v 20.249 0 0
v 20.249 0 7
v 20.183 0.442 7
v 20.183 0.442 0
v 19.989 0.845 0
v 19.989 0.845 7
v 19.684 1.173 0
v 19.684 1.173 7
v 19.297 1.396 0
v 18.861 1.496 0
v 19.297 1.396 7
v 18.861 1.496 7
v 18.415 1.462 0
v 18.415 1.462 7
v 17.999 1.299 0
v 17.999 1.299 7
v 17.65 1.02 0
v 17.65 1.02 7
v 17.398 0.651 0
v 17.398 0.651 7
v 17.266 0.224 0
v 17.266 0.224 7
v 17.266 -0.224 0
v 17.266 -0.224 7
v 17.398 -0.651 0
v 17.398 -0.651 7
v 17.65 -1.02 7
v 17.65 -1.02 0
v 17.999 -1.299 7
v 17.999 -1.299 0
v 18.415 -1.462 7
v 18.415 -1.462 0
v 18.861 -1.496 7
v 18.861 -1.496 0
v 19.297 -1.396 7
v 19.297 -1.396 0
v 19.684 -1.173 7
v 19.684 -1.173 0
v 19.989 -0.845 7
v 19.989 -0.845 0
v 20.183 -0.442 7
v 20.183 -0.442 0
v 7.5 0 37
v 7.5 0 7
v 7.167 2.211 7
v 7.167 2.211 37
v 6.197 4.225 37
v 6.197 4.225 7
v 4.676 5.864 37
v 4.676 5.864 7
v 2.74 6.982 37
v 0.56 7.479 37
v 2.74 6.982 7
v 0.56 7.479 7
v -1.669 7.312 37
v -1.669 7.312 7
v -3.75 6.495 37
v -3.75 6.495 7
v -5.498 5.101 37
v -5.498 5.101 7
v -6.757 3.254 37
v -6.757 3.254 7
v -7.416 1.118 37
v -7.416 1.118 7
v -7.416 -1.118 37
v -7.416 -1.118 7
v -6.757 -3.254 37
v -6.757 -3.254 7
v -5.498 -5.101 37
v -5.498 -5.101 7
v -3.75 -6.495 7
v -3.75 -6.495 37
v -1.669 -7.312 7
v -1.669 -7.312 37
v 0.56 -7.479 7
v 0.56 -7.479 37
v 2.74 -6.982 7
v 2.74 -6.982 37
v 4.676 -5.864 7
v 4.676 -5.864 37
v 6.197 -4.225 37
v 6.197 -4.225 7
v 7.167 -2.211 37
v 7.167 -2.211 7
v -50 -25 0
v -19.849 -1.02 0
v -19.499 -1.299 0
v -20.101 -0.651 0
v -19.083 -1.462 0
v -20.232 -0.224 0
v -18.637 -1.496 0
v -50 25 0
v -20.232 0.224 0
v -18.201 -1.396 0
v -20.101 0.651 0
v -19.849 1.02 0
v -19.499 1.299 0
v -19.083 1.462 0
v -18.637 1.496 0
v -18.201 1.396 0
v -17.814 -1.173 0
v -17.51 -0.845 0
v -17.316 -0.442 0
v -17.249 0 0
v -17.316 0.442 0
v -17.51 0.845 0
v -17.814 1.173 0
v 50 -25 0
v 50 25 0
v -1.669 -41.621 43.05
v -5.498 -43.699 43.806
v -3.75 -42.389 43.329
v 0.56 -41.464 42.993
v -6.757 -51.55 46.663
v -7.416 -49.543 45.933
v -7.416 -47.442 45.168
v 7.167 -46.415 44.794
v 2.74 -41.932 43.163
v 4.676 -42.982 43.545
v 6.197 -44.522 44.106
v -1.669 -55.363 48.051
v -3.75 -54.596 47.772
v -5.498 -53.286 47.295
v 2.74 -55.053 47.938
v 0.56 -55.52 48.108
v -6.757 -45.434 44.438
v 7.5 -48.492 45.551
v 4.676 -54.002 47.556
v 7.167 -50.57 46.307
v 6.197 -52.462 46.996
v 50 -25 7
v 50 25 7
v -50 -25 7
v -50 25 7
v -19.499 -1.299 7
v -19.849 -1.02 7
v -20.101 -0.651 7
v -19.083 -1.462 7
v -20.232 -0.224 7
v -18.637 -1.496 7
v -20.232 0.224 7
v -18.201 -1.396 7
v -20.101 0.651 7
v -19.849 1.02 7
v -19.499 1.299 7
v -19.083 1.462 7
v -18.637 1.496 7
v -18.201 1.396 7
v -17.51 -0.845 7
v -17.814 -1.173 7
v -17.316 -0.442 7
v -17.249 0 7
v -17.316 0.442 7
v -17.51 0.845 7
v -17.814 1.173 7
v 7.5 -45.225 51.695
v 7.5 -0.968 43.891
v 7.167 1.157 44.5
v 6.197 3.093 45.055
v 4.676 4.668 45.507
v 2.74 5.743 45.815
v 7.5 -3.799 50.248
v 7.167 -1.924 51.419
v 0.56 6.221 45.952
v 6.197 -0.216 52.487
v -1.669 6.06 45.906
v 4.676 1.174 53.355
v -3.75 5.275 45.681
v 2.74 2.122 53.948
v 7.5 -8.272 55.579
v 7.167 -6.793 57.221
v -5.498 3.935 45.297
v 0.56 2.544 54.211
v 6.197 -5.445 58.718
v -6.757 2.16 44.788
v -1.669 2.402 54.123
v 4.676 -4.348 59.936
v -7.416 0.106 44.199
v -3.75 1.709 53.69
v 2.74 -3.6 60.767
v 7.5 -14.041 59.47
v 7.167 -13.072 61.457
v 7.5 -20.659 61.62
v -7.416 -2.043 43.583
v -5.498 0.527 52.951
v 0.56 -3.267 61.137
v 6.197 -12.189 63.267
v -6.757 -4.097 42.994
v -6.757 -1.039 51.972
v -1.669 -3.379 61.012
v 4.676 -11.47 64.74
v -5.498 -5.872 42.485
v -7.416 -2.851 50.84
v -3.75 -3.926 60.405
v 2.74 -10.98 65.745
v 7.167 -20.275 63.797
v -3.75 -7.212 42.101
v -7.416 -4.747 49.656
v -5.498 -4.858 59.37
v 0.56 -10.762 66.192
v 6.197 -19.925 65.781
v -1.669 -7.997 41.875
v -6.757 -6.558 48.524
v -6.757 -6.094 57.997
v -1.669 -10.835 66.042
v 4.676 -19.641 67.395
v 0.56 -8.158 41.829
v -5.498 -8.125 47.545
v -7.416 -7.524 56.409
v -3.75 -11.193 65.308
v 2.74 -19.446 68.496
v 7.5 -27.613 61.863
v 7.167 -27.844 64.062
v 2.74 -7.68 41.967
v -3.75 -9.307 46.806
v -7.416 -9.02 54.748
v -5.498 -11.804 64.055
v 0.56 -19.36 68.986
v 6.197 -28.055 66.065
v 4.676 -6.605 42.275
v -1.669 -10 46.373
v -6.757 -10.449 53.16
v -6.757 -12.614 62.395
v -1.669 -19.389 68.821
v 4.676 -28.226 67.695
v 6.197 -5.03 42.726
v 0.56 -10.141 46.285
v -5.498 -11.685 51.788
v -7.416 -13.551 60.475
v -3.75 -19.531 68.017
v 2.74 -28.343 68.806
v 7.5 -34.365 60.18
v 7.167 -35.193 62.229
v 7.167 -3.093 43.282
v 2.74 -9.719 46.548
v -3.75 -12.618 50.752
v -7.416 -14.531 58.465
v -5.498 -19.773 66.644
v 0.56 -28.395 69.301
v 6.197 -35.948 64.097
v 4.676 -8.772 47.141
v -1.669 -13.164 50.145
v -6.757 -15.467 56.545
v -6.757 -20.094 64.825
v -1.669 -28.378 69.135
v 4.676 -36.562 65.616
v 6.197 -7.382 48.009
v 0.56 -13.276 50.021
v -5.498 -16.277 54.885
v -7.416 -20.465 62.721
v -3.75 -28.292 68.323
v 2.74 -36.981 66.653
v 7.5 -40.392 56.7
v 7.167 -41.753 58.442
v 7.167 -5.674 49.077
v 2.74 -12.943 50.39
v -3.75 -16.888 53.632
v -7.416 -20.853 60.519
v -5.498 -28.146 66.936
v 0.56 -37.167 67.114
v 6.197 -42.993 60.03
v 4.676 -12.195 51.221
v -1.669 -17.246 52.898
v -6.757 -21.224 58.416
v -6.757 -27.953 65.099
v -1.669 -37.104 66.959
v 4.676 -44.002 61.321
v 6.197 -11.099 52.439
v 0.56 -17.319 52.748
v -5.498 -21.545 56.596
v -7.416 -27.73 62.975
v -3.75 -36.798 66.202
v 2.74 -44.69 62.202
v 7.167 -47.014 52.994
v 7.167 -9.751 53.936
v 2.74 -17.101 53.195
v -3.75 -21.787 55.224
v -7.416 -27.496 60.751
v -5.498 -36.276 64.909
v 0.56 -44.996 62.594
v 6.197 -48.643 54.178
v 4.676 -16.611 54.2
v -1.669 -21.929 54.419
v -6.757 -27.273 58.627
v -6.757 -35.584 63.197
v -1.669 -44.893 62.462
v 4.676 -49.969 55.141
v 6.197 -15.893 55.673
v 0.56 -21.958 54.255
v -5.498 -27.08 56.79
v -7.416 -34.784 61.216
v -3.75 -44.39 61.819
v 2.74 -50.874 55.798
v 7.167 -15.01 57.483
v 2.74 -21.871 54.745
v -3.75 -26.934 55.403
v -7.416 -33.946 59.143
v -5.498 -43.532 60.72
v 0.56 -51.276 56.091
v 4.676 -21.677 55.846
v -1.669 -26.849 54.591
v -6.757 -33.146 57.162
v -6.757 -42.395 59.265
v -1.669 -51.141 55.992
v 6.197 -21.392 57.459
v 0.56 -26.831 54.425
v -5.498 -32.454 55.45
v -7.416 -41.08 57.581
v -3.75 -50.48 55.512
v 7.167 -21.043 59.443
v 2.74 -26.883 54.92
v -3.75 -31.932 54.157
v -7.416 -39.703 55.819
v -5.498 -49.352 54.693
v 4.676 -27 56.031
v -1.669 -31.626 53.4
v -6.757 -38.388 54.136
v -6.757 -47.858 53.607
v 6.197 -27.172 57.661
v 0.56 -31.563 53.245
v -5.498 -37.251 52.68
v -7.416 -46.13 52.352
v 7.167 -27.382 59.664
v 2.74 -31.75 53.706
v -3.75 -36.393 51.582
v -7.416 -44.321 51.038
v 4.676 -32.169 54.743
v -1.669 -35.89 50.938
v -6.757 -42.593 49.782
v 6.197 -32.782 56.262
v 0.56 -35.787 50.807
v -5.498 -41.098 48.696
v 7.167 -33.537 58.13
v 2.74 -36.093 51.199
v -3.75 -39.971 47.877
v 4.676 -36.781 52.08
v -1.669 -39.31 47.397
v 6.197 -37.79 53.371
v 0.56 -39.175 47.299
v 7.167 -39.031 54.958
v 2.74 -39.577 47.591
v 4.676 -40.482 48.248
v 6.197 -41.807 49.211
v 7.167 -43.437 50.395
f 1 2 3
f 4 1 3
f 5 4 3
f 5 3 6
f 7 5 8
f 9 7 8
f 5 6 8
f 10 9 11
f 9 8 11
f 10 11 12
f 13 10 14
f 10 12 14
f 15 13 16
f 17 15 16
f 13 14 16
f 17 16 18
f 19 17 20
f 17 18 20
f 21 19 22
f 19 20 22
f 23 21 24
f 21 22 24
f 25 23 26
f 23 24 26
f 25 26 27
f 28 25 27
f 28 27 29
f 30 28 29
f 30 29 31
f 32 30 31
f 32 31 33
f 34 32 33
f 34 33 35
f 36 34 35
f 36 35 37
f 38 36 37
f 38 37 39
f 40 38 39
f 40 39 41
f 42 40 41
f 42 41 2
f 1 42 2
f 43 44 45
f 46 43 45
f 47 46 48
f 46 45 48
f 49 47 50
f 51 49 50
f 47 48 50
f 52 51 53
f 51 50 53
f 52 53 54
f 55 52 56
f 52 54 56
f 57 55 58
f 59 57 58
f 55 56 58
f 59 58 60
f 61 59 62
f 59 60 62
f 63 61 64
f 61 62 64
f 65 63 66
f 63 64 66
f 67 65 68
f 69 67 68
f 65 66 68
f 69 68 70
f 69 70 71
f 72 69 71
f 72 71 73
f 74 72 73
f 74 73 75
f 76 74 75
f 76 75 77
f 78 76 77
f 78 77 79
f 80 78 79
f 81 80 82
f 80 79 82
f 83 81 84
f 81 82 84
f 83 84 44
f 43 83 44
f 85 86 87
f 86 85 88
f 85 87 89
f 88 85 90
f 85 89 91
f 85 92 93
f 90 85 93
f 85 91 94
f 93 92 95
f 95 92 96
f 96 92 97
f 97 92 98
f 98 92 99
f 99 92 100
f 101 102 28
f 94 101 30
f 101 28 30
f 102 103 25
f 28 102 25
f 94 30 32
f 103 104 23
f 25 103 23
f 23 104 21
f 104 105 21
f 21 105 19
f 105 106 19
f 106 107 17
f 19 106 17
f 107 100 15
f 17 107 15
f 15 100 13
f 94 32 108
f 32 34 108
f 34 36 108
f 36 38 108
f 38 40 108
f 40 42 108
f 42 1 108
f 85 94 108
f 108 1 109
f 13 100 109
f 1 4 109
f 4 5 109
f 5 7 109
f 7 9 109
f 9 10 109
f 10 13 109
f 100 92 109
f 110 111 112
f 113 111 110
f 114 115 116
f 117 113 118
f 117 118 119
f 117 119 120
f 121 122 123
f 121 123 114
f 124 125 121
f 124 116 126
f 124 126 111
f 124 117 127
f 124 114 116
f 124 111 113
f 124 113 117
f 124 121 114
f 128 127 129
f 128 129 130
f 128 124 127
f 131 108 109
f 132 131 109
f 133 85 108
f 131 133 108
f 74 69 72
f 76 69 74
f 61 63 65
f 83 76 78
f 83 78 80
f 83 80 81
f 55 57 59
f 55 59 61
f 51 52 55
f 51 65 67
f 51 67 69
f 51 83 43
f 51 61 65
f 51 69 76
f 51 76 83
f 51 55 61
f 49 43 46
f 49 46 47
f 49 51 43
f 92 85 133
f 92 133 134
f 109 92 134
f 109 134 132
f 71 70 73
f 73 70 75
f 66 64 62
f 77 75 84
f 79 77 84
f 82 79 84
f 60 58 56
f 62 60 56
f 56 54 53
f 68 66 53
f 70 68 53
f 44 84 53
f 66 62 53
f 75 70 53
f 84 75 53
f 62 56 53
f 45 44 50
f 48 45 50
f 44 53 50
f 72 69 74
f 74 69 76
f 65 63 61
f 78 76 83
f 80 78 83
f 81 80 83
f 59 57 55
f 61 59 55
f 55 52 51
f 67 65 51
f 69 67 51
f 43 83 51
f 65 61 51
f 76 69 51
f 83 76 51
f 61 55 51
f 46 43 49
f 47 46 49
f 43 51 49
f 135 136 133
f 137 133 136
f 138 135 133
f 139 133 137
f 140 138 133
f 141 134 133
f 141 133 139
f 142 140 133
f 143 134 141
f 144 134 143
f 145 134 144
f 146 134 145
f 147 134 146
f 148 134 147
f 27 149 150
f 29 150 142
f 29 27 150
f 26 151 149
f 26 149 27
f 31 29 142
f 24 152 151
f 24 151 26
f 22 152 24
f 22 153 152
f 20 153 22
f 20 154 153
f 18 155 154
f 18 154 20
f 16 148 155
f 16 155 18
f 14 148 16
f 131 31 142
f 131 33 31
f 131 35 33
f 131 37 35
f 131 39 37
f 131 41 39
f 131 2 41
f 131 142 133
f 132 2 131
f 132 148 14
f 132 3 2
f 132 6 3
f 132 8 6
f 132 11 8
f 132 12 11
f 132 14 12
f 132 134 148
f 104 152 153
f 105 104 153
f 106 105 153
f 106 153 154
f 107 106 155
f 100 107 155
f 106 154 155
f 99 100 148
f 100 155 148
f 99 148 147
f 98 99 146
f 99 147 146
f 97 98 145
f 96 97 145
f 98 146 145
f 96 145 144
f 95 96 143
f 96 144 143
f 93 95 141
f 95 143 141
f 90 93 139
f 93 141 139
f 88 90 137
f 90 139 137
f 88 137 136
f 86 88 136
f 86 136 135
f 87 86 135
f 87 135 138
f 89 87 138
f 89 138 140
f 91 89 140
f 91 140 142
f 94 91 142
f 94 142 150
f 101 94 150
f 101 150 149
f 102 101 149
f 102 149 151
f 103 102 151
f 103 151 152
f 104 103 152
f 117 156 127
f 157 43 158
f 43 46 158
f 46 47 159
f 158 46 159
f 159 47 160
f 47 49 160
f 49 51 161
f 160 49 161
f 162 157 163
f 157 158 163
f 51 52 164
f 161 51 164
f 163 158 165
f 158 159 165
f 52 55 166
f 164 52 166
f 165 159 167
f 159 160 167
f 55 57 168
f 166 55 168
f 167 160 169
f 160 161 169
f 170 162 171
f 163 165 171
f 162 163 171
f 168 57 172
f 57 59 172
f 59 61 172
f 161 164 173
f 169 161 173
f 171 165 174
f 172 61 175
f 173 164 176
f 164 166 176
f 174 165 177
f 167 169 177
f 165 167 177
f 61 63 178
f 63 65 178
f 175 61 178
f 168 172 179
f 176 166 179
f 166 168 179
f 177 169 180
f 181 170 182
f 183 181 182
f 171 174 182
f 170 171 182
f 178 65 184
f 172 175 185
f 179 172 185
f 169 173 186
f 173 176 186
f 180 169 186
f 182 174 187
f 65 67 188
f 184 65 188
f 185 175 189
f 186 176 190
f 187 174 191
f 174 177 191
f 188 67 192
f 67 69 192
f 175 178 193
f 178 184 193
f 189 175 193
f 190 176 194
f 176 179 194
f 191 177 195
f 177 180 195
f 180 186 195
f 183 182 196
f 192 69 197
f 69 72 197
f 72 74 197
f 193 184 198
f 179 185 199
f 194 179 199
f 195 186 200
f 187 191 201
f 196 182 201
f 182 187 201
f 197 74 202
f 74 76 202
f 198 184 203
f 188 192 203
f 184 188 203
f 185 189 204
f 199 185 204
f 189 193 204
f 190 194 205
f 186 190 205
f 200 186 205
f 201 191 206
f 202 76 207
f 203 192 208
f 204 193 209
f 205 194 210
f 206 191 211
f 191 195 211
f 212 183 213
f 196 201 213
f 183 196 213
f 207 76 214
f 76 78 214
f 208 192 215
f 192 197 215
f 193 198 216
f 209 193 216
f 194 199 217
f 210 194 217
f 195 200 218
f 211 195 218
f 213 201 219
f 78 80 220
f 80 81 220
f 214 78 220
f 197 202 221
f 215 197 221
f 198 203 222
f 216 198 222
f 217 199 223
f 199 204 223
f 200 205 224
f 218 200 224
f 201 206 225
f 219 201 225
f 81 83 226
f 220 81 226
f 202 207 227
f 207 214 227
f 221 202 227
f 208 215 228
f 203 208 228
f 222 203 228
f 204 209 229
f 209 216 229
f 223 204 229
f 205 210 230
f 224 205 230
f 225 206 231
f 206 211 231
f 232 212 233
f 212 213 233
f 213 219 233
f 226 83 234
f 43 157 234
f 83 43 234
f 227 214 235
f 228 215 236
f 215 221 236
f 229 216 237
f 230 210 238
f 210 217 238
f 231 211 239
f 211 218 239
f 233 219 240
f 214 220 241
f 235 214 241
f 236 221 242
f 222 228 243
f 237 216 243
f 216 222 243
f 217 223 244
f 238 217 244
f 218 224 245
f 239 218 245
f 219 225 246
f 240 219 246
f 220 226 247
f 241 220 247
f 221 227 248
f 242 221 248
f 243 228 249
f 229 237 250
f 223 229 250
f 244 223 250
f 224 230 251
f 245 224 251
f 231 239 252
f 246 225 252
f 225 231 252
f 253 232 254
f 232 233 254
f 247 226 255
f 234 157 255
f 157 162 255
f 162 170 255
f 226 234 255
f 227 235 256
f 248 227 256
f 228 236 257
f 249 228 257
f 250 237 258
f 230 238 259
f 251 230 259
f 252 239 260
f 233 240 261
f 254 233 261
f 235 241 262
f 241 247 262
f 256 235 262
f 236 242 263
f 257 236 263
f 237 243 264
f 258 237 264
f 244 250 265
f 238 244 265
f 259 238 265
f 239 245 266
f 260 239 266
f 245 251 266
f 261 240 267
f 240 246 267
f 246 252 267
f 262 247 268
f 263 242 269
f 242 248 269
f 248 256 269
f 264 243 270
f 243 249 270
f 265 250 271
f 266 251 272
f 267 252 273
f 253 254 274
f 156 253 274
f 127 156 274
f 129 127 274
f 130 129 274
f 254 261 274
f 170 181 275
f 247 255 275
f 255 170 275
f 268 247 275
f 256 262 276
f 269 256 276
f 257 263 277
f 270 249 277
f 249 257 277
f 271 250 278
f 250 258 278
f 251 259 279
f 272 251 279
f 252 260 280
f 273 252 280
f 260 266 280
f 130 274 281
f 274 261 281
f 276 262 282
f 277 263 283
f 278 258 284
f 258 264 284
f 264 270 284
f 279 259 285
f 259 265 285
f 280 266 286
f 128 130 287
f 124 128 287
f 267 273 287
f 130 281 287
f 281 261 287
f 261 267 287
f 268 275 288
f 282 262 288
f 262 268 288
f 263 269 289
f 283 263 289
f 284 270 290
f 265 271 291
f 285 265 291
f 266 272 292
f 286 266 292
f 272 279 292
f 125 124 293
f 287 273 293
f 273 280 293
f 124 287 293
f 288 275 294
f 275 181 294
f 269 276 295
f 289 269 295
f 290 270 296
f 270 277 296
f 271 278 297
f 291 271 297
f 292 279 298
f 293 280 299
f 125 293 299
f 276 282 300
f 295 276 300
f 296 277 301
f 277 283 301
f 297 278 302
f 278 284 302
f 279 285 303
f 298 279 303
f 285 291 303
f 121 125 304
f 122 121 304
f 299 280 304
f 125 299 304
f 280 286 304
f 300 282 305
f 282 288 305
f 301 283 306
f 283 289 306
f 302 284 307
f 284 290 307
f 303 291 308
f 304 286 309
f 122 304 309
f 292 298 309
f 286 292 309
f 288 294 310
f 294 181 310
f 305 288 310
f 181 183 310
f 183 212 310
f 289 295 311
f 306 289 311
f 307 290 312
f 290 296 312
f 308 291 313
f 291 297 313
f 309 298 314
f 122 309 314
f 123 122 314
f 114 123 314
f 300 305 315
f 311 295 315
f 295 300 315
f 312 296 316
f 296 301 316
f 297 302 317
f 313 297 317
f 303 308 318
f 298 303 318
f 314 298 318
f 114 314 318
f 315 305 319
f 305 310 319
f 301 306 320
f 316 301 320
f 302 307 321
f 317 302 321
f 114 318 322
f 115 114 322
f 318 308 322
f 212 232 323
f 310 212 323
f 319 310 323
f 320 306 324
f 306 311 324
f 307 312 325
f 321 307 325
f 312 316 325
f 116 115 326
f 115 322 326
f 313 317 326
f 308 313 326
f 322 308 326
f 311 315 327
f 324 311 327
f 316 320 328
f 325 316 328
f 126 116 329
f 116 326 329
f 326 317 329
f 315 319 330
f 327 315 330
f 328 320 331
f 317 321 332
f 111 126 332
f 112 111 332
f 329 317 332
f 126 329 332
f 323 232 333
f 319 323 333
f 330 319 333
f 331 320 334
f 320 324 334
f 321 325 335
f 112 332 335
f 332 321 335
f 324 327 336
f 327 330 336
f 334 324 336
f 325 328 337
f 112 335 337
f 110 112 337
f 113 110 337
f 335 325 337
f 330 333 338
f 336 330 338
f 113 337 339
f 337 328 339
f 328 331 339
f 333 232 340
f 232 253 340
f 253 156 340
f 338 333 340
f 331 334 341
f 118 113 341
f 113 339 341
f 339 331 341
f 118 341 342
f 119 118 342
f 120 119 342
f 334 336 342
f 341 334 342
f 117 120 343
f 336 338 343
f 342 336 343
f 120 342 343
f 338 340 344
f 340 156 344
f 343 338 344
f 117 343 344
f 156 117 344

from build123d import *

# Parameters (mm, degrees)
F0_W     = 100
F0_H     = 50
F1_DEPTH = 7
F2_R     = 1.5
F3_DEPTH = 25
F4_R     = 7.5
F5_DEPTH = 30
F4_W     = 5.0690565258
F4_H     = 5.2306629717
F6_R     = 7.5
F7_ANGLE = 160


with BuildPart() as f1:
    # F0 (on Top) → F1 (new body)
    with BuildSketch(Plane.XY):
        Rectangle(F0_W, F0_H)
    extrude(amount=F1_DEPTH)

    # F2 (on face) → F3 (cut)
    with BuildSketch(Plane.XY.offset(7)):
        with Locations((18.7491867621, 0)):
            Circle(F2_R)
        with Locations((-18.7491867621, 0)):
            Circle(F2_R)
    extrude(amount=-F3_DEPTH, mode=Mode.SUBTRACT)


with BuildPart() as f5:
    # F4 (on face) → F5 (new body)
    with BuildSketch(Plane.XY.offset(7)):
        Circle(F4_R)
    extrude(amount=F5_DEPTH)


with BuildPart() as f5b:
    # F4 (on face) → F5, piece 2 (new body)
    with BuildSketch(Plane.XY.offset(7)):
        with Locations((2.5345282629, -22.3846685141)):
            Rectangle(F4_W, F4_H)
    extrude(amount=F5_DEPTH)


with BuildPart() as f7:
    # F6 (on face) → F7 (revolve)
    with BuildSketch(Plane.XY.offset(37)):
        Circle(F6_R)
    revolve(axis=Axis((2.5345282629, -25, 37), (1, 0, 0)), revolution_arc=F7_ANGLE)


solid = Compound([f1.part, f5.part, f7.part])
